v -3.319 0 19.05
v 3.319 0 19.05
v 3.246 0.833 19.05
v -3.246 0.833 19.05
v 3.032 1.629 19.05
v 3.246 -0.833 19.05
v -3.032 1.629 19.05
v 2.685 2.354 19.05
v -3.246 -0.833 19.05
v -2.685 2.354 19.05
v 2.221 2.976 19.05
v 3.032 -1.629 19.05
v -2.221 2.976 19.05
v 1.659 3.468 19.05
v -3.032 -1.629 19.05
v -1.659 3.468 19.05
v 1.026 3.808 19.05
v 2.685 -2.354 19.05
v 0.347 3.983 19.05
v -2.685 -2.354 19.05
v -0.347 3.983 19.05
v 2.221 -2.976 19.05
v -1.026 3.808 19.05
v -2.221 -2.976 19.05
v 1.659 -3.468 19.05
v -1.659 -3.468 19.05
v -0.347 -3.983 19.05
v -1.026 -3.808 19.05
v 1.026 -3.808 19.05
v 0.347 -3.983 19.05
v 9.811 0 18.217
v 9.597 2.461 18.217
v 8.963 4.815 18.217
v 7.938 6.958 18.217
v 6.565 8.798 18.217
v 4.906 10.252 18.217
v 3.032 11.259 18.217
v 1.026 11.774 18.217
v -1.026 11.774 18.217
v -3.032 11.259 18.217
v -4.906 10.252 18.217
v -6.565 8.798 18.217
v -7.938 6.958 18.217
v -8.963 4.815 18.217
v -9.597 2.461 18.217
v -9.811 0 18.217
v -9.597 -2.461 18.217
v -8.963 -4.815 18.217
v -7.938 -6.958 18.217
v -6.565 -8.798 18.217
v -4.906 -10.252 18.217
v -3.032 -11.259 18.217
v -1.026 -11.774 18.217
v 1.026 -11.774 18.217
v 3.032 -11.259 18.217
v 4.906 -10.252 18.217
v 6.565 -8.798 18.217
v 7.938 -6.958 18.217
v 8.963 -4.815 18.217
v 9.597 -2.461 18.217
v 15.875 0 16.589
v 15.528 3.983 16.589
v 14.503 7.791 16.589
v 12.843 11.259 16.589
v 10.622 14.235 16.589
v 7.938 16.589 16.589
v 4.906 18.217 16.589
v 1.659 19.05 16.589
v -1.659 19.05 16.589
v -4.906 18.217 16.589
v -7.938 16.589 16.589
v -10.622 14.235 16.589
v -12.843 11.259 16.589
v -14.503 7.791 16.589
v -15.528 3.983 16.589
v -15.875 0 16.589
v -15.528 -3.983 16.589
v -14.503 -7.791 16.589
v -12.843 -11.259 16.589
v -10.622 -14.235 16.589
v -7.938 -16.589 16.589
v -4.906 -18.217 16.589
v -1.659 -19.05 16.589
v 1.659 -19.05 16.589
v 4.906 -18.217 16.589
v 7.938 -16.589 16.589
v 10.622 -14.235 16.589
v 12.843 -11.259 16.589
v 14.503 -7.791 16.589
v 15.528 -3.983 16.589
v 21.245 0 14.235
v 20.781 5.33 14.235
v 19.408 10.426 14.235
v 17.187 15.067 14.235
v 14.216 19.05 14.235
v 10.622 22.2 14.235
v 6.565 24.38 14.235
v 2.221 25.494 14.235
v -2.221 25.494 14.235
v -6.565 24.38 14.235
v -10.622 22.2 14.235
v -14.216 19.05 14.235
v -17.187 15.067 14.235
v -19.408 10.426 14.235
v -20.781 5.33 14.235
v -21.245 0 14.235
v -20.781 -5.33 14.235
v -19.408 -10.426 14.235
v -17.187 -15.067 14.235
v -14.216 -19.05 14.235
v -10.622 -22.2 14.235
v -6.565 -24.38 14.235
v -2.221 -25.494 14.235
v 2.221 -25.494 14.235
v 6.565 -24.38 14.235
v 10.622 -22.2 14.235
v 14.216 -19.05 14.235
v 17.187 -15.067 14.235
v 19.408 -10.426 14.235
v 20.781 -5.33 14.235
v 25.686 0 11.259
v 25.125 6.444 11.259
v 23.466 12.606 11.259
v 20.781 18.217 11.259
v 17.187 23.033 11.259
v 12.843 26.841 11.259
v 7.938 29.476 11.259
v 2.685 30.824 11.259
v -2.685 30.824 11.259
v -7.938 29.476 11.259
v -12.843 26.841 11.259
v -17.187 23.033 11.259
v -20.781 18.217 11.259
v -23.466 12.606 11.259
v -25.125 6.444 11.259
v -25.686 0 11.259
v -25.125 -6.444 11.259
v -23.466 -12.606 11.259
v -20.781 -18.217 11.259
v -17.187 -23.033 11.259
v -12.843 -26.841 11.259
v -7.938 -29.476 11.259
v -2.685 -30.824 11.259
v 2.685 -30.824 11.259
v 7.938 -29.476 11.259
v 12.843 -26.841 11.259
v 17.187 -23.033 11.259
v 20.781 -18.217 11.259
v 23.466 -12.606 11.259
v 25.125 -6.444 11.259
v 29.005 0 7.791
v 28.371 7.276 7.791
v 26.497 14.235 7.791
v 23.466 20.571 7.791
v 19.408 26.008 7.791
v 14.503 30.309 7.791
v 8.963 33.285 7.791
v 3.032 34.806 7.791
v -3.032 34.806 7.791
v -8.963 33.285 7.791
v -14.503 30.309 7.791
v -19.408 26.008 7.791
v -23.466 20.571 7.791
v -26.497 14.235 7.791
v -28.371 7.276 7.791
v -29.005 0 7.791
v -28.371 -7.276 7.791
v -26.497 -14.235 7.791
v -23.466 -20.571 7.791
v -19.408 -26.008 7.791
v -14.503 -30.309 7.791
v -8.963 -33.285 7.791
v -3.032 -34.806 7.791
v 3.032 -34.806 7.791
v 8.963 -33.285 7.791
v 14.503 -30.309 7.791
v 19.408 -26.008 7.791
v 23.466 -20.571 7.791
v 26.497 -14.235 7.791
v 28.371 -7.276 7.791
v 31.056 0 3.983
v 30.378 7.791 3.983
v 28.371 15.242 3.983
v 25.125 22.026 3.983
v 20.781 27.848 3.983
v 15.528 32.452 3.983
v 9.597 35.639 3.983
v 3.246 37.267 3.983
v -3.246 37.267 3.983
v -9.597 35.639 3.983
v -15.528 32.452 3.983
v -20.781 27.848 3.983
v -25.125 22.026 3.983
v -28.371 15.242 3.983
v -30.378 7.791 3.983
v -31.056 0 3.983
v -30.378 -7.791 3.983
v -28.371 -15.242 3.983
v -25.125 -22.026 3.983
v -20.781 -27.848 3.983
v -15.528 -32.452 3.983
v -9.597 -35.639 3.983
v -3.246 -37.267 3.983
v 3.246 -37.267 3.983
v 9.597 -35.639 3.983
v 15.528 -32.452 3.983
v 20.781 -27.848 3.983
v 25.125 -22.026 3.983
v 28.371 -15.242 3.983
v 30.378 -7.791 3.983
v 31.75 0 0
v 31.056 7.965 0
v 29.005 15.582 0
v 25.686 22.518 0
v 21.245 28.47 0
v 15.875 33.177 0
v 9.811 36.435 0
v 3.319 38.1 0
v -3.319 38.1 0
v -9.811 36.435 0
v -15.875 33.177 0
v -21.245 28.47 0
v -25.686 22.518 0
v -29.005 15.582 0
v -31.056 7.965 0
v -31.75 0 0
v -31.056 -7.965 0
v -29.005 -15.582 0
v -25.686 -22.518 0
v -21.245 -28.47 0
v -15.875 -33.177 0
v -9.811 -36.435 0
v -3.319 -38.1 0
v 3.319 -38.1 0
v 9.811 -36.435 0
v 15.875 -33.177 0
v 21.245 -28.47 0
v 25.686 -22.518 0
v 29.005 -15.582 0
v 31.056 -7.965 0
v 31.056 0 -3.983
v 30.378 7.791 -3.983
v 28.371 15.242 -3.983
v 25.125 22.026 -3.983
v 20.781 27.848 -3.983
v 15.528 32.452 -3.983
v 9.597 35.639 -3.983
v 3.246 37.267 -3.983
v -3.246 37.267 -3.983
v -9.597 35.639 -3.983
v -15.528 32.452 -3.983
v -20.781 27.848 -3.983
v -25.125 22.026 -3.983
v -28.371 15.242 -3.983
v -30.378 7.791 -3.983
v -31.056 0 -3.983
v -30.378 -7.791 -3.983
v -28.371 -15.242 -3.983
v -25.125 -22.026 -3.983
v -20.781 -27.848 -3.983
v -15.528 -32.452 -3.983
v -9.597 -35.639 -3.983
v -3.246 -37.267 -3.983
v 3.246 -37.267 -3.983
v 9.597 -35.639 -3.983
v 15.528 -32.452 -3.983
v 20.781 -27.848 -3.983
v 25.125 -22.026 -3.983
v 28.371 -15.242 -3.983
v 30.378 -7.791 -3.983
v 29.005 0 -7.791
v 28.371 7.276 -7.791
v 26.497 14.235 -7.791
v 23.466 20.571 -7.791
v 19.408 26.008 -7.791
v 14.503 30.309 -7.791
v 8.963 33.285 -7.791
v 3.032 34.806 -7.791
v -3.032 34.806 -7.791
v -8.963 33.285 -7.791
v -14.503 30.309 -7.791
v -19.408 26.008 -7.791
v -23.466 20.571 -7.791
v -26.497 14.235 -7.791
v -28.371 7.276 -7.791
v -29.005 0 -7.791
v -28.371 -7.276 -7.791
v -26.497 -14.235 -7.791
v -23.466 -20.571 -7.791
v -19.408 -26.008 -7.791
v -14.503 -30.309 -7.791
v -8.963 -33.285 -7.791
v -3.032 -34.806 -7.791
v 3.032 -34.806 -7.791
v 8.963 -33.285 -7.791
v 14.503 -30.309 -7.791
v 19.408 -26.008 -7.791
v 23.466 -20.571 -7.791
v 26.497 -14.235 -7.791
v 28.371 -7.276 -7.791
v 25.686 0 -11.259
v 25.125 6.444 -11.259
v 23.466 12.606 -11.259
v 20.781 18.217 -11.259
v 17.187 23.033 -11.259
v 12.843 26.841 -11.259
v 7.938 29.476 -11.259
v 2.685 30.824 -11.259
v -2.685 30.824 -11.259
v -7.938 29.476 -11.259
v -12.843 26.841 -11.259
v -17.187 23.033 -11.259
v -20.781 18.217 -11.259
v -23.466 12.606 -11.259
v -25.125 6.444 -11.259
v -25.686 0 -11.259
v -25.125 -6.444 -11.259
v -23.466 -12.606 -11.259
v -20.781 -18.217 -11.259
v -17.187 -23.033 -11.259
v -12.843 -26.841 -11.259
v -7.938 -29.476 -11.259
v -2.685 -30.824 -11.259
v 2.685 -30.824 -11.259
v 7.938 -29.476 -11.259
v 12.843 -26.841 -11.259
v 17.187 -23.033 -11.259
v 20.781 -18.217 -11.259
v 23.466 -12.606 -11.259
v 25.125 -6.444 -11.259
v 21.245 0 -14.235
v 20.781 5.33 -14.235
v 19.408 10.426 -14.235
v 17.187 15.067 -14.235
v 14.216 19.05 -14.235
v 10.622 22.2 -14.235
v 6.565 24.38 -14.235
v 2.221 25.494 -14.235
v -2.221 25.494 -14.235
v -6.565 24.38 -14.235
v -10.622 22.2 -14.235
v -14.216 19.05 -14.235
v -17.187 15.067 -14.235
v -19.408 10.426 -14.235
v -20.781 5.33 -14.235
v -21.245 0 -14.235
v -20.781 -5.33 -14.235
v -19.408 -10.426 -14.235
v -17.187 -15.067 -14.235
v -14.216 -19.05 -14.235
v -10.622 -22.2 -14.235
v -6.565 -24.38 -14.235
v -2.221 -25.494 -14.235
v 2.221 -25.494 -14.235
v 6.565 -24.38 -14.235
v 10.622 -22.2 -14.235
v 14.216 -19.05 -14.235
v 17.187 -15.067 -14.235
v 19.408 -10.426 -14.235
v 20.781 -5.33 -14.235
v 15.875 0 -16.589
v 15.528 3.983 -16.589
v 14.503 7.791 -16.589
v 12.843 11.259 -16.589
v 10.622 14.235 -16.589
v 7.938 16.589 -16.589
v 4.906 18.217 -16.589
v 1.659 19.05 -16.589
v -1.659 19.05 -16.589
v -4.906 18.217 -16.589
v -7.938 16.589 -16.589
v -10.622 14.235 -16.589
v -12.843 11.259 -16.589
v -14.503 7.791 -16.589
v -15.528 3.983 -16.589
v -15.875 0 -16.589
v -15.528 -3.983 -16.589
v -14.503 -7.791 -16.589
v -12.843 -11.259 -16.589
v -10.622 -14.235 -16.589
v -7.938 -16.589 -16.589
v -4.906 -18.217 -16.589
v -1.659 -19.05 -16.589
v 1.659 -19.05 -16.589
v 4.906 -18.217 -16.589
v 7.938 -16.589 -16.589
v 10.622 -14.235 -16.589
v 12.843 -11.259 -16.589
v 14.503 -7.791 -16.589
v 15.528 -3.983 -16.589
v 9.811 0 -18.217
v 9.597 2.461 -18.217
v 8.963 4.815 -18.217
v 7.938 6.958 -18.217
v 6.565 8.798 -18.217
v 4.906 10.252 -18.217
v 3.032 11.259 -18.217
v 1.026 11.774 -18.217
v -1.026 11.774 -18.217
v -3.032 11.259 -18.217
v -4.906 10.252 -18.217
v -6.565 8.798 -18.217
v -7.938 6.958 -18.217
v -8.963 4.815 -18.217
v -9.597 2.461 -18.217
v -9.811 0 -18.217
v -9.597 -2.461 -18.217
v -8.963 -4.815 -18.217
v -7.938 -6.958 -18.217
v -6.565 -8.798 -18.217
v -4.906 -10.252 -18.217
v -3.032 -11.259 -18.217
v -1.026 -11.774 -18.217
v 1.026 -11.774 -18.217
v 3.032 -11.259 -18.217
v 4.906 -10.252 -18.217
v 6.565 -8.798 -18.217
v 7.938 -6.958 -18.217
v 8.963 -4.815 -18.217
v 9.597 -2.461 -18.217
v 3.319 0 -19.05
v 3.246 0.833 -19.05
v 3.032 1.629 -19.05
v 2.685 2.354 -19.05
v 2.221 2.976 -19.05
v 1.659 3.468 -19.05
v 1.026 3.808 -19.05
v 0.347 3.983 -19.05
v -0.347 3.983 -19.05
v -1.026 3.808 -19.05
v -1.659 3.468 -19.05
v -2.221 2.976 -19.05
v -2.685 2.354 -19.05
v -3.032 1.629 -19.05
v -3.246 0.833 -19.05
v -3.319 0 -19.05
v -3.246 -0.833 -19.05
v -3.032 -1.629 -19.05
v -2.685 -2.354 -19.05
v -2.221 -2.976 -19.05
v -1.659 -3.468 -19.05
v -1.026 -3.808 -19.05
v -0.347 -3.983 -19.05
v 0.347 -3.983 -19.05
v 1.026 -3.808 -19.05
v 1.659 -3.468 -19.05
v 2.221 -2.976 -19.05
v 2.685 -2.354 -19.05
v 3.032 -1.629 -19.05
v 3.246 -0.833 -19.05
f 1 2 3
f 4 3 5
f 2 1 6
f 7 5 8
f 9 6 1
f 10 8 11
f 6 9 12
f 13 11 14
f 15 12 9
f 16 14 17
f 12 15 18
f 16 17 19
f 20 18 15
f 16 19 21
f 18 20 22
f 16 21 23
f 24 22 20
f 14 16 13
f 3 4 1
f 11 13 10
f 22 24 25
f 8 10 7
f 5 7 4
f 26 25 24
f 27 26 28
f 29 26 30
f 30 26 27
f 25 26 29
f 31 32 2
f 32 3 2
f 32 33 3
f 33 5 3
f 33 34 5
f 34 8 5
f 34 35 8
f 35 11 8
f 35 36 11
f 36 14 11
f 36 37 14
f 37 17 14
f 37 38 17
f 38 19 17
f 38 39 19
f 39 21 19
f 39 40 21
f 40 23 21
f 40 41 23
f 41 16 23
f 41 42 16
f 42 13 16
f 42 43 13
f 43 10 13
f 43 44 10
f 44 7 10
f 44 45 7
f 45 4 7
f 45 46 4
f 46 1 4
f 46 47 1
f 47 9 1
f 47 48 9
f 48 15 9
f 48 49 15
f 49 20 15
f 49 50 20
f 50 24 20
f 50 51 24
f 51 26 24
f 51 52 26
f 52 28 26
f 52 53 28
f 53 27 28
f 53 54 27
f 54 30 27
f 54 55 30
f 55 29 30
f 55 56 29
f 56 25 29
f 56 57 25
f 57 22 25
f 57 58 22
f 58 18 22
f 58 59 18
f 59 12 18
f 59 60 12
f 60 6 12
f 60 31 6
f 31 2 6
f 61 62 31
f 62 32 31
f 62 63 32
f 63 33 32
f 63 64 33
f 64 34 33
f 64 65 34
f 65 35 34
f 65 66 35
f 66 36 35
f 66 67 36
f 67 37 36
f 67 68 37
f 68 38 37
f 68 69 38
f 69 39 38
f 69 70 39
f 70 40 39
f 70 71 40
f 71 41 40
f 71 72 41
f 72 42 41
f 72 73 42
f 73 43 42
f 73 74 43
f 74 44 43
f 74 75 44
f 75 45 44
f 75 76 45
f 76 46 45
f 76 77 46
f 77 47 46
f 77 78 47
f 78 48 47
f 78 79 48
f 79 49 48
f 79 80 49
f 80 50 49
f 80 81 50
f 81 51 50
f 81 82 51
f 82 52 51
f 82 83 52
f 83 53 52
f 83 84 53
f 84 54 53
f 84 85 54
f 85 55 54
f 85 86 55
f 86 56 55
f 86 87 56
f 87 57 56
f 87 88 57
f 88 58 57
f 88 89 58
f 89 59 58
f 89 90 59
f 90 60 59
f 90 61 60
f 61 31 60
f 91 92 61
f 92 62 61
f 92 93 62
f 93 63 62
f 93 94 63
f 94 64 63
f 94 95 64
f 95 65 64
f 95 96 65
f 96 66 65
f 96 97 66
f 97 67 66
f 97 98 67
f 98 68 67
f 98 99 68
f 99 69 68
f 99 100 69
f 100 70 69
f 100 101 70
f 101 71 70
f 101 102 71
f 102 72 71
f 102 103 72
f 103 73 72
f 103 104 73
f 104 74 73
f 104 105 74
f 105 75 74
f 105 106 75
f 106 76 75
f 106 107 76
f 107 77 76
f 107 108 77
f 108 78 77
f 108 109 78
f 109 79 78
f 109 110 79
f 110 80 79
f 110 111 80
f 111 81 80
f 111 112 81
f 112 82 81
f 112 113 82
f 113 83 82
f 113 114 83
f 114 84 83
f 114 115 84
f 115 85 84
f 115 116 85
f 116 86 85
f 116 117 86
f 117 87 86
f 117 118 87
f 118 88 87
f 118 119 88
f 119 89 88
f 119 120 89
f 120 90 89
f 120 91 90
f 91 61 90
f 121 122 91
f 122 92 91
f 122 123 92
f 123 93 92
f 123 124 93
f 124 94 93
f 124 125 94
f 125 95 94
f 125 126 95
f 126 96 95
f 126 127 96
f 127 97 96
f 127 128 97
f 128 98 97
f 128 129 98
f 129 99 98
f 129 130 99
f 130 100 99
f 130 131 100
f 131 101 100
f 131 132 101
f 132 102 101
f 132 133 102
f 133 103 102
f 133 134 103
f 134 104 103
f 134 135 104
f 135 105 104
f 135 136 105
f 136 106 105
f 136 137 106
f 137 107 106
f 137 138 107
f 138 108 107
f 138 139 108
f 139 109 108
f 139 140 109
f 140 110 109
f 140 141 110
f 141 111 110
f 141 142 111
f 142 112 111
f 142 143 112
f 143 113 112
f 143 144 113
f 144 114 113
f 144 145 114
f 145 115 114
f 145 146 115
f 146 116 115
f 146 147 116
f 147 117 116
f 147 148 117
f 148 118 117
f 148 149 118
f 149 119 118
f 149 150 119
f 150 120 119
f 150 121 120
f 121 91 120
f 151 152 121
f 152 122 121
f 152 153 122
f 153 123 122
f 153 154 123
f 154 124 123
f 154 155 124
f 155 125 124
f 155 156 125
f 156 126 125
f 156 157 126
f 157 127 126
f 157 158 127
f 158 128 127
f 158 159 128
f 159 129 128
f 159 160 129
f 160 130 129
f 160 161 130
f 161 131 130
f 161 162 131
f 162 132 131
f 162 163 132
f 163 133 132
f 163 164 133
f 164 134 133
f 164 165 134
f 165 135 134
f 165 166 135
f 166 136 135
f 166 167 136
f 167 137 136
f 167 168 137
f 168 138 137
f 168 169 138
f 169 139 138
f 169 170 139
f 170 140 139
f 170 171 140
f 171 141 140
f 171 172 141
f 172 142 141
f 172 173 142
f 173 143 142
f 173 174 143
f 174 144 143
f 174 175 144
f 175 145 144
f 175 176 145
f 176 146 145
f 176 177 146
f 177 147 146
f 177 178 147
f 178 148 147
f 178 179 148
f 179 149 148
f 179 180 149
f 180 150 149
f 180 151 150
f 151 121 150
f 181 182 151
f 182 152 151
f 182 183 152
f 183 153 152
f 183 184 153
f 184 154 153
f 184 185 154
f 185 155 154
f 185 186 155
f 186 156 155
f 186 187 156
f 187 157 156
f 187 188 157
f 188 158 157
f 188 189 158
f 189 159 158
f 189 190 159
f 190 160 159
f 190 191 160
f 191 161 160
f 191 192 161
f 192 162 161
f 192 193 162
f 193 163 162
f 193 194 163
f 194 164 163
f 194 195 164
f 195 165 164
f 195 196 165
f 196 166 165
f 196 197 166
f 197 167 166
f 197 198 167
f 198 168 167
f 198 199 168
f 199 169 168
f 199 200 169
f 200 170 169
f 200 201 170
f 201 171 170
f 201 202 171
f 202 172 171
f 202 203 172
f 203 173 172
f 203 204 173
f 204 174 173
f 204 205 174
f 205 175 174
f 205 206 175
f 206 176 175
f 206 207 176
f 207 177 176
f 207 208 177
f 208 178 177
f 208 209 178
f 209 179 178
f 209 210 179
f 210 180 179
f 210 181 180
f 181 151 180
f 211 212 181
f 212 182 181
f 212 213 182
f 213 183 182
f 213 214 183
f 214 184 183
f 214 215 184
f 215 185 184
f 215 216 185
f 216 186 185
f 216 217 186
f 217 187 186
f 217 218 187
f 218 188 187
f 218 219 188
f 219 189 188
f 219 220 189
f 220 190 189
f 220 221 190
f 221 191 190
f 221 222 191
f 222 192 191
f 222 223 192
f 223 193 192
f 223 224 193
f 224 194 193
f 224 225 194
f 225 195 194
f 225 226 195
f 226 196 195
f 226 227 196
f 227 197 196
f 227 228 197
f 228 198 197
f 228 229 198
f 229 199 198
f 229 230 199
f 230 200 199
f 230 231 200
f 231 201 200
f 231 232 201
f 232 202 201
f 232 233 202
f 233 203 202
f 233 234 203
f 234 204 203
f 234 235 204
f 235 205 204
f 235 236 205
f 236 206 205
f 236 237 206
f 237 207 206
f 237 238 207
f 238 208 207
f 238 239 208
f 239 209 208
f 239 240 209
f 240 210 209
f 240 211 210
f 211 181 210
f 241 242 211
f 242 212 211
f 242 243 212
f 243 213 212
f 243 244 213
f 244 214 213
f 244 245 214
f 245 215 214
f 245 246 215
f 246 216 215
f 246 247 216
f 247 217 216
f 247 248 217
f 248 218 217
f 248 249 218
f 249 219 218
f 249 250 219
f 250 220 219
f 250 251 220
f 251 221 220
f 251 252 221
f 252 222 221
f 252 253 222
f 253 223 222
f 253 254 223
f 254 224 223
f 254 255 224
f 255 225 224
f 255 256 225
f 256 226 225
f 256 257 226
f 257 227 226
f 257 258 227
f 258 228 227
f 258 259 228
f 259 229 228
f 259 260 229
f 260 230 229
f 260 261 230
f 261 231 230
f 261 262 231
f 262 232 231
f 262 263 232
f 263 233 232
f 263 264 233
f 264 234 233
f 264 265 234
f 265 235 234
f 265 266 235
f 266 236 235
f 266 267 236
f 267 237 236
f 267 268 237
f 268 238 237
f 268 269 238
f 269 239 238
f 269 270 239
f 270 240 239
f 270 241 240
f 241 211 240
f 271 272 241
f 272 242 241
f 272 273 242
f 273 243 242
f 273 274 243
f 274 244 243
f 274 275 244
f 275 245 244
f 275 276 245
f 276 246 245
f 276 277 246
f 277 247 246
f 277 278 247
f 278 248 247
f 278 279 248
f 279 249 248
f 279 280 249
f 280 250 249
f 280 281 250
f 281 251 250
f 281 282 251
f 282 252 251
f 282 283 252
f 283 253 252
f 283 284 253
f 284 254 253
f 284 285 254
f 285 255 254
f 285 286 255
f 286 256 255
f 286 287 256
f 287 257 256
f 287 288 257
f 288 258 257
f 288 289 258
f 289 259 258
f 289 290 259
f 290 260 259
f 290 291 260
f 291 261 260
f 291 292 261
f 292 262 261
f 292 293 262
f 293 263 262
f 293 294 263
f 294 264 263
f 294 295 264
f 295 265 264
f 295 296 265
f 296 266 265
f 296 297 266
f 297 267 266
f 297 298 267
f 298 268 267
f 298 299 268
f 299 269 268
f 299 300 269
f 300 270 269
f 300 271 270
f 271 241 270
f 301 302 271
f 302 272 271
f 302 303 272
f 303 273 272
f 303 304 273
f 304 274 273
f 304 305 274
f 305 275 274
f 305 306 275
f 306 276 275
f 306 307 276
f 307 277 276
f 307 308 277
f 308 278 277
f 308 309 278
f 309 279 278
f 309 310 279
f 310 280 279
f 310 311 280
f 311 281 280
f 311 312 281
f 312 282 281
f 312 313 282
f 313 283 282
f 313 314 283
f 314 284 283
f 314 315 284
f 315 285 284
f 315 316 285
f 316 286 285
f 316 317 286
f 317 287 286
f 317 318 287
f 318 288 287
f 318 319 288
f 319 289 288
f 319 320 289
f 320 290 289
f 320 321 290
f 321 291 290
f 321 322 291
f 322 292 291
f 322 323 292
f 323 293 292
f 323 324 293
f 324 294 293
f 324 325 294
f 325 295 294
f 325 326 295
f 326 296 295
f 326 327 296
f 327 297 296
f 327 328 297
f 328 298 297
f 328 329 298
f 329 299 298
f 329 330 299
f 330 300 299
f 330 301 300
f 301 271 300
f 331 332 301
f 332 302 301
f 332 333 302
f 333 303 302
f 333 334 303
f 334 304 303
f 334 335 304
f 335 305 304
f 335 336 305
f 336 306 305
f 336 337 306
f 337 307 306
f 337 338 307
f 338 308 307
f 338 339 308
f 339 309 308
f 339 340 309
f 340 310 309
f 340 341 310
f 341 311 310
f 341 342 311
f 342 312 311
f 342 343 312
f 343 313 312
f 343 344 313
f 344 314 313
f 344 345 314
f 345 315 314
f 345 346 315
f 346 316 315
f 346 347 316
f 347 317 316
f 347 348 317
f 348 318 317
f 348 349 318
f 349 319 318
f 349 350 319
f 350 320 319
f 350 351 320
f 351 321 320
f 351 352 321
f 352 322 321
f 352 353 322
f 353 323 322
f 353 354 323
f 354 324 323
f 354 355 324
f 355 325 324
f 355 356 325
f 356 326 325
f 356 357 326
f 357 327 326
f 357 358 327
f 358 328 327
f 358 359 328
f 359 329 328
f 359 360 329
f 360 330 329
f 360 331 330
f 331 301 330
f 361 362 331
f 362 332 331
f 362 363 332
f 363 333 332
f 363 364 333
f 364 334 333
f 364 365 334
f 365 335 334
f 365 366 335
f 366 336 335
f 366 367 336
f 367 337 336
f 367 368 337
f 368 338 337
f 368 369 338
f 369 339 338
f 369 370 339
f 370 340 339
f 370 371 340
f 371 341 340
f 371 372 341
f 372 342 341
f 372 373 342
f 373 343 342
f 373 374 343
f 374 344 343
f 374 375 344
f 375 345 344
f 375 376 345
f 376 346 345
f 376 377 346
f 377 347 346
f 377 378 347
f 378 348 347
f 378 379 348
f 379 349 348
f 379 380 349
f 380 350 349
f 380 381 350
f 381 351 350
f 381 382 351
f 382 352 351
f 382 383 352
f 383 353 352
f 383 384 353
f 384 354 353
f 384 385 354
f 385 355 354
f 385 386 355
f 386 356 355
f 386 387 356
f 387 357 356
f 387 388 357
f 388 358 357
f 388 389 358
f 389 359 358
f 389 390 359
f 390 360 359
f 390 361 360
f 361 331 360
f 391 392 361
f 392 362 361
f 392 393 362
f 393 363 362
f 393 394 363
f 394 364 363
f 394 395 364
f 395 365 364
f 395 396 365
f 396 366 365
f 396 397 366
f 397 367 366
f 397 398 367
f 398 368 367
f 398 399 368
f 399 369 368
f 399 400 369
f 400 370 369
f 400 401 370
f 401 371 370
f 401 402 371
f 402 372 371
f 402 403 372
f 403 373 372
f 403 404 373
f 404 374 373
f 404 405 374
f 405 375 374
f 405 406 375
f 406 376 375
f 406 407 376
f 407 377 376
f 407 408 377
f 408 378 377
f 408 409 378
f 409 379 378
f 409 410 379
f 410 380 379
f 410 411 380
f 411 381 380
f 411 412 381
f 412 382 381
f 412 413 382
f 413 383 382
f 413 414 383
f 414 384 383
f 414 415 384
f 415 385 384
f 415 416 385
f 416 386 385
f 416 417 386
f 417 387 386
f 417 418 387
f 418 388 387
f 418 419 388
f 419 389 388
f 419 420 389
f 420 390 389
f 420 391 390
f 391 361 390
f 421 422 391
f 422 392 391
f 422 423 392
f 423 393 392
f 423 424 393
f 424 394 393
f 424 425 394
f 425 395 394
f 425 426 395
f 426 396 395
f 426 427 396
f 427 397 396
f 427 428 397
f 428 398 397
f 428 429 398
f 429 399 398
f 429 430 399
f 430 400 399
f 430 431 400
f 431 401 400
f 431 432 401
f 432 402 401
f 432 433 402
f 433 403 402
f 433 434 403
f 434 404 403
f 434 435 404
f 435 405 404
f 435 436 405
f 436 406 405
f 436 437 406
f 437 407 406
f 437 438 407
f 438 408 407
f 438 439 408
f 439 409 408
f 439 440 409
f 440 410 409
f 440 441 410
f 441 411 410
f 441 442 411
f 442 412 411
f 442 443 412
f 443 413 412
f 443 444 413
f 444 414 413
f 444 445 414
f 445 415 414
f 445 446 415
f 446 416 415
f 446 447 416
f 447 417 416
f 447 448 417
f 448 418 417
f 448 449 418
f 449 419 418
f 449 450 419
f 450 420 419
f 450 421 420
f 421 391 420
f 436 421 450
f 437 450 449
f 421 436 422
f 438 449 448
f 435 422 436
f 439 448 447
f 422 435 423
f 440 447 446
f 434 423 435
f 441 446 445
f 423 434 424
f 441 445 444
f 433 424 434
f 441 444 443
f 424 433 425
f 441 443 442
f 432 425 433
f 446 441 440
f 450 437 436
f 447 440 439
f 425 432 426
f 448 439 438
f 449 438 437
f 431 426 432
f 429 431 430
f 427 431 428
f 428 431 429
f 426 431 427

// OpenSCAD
//Enter in inches how far the gem goes forward
height = 1.5;

//Enter in inches how wide it must be
width = 2.5;

//Enter in inches how long it must be (equal or higher than width!)
length = 3;

//Leave the back flat?
flat_back = 0; // [1:Leave Back Flat, 0:No! Both Sides]

cubehelp = (length + 10)*25.4;


if (flat_back == 1)
{
difference(){
	resize([width*25.4, length*25.4, height*25.4]) sphere(10);
	translate([-cubehelp/2, -cubehelp/2, -cubehelp]) cube(cubehelp);
	}
}
else
{
	resize([width*25.4, length*25.4, height*25.4]) sphere(10);
}
